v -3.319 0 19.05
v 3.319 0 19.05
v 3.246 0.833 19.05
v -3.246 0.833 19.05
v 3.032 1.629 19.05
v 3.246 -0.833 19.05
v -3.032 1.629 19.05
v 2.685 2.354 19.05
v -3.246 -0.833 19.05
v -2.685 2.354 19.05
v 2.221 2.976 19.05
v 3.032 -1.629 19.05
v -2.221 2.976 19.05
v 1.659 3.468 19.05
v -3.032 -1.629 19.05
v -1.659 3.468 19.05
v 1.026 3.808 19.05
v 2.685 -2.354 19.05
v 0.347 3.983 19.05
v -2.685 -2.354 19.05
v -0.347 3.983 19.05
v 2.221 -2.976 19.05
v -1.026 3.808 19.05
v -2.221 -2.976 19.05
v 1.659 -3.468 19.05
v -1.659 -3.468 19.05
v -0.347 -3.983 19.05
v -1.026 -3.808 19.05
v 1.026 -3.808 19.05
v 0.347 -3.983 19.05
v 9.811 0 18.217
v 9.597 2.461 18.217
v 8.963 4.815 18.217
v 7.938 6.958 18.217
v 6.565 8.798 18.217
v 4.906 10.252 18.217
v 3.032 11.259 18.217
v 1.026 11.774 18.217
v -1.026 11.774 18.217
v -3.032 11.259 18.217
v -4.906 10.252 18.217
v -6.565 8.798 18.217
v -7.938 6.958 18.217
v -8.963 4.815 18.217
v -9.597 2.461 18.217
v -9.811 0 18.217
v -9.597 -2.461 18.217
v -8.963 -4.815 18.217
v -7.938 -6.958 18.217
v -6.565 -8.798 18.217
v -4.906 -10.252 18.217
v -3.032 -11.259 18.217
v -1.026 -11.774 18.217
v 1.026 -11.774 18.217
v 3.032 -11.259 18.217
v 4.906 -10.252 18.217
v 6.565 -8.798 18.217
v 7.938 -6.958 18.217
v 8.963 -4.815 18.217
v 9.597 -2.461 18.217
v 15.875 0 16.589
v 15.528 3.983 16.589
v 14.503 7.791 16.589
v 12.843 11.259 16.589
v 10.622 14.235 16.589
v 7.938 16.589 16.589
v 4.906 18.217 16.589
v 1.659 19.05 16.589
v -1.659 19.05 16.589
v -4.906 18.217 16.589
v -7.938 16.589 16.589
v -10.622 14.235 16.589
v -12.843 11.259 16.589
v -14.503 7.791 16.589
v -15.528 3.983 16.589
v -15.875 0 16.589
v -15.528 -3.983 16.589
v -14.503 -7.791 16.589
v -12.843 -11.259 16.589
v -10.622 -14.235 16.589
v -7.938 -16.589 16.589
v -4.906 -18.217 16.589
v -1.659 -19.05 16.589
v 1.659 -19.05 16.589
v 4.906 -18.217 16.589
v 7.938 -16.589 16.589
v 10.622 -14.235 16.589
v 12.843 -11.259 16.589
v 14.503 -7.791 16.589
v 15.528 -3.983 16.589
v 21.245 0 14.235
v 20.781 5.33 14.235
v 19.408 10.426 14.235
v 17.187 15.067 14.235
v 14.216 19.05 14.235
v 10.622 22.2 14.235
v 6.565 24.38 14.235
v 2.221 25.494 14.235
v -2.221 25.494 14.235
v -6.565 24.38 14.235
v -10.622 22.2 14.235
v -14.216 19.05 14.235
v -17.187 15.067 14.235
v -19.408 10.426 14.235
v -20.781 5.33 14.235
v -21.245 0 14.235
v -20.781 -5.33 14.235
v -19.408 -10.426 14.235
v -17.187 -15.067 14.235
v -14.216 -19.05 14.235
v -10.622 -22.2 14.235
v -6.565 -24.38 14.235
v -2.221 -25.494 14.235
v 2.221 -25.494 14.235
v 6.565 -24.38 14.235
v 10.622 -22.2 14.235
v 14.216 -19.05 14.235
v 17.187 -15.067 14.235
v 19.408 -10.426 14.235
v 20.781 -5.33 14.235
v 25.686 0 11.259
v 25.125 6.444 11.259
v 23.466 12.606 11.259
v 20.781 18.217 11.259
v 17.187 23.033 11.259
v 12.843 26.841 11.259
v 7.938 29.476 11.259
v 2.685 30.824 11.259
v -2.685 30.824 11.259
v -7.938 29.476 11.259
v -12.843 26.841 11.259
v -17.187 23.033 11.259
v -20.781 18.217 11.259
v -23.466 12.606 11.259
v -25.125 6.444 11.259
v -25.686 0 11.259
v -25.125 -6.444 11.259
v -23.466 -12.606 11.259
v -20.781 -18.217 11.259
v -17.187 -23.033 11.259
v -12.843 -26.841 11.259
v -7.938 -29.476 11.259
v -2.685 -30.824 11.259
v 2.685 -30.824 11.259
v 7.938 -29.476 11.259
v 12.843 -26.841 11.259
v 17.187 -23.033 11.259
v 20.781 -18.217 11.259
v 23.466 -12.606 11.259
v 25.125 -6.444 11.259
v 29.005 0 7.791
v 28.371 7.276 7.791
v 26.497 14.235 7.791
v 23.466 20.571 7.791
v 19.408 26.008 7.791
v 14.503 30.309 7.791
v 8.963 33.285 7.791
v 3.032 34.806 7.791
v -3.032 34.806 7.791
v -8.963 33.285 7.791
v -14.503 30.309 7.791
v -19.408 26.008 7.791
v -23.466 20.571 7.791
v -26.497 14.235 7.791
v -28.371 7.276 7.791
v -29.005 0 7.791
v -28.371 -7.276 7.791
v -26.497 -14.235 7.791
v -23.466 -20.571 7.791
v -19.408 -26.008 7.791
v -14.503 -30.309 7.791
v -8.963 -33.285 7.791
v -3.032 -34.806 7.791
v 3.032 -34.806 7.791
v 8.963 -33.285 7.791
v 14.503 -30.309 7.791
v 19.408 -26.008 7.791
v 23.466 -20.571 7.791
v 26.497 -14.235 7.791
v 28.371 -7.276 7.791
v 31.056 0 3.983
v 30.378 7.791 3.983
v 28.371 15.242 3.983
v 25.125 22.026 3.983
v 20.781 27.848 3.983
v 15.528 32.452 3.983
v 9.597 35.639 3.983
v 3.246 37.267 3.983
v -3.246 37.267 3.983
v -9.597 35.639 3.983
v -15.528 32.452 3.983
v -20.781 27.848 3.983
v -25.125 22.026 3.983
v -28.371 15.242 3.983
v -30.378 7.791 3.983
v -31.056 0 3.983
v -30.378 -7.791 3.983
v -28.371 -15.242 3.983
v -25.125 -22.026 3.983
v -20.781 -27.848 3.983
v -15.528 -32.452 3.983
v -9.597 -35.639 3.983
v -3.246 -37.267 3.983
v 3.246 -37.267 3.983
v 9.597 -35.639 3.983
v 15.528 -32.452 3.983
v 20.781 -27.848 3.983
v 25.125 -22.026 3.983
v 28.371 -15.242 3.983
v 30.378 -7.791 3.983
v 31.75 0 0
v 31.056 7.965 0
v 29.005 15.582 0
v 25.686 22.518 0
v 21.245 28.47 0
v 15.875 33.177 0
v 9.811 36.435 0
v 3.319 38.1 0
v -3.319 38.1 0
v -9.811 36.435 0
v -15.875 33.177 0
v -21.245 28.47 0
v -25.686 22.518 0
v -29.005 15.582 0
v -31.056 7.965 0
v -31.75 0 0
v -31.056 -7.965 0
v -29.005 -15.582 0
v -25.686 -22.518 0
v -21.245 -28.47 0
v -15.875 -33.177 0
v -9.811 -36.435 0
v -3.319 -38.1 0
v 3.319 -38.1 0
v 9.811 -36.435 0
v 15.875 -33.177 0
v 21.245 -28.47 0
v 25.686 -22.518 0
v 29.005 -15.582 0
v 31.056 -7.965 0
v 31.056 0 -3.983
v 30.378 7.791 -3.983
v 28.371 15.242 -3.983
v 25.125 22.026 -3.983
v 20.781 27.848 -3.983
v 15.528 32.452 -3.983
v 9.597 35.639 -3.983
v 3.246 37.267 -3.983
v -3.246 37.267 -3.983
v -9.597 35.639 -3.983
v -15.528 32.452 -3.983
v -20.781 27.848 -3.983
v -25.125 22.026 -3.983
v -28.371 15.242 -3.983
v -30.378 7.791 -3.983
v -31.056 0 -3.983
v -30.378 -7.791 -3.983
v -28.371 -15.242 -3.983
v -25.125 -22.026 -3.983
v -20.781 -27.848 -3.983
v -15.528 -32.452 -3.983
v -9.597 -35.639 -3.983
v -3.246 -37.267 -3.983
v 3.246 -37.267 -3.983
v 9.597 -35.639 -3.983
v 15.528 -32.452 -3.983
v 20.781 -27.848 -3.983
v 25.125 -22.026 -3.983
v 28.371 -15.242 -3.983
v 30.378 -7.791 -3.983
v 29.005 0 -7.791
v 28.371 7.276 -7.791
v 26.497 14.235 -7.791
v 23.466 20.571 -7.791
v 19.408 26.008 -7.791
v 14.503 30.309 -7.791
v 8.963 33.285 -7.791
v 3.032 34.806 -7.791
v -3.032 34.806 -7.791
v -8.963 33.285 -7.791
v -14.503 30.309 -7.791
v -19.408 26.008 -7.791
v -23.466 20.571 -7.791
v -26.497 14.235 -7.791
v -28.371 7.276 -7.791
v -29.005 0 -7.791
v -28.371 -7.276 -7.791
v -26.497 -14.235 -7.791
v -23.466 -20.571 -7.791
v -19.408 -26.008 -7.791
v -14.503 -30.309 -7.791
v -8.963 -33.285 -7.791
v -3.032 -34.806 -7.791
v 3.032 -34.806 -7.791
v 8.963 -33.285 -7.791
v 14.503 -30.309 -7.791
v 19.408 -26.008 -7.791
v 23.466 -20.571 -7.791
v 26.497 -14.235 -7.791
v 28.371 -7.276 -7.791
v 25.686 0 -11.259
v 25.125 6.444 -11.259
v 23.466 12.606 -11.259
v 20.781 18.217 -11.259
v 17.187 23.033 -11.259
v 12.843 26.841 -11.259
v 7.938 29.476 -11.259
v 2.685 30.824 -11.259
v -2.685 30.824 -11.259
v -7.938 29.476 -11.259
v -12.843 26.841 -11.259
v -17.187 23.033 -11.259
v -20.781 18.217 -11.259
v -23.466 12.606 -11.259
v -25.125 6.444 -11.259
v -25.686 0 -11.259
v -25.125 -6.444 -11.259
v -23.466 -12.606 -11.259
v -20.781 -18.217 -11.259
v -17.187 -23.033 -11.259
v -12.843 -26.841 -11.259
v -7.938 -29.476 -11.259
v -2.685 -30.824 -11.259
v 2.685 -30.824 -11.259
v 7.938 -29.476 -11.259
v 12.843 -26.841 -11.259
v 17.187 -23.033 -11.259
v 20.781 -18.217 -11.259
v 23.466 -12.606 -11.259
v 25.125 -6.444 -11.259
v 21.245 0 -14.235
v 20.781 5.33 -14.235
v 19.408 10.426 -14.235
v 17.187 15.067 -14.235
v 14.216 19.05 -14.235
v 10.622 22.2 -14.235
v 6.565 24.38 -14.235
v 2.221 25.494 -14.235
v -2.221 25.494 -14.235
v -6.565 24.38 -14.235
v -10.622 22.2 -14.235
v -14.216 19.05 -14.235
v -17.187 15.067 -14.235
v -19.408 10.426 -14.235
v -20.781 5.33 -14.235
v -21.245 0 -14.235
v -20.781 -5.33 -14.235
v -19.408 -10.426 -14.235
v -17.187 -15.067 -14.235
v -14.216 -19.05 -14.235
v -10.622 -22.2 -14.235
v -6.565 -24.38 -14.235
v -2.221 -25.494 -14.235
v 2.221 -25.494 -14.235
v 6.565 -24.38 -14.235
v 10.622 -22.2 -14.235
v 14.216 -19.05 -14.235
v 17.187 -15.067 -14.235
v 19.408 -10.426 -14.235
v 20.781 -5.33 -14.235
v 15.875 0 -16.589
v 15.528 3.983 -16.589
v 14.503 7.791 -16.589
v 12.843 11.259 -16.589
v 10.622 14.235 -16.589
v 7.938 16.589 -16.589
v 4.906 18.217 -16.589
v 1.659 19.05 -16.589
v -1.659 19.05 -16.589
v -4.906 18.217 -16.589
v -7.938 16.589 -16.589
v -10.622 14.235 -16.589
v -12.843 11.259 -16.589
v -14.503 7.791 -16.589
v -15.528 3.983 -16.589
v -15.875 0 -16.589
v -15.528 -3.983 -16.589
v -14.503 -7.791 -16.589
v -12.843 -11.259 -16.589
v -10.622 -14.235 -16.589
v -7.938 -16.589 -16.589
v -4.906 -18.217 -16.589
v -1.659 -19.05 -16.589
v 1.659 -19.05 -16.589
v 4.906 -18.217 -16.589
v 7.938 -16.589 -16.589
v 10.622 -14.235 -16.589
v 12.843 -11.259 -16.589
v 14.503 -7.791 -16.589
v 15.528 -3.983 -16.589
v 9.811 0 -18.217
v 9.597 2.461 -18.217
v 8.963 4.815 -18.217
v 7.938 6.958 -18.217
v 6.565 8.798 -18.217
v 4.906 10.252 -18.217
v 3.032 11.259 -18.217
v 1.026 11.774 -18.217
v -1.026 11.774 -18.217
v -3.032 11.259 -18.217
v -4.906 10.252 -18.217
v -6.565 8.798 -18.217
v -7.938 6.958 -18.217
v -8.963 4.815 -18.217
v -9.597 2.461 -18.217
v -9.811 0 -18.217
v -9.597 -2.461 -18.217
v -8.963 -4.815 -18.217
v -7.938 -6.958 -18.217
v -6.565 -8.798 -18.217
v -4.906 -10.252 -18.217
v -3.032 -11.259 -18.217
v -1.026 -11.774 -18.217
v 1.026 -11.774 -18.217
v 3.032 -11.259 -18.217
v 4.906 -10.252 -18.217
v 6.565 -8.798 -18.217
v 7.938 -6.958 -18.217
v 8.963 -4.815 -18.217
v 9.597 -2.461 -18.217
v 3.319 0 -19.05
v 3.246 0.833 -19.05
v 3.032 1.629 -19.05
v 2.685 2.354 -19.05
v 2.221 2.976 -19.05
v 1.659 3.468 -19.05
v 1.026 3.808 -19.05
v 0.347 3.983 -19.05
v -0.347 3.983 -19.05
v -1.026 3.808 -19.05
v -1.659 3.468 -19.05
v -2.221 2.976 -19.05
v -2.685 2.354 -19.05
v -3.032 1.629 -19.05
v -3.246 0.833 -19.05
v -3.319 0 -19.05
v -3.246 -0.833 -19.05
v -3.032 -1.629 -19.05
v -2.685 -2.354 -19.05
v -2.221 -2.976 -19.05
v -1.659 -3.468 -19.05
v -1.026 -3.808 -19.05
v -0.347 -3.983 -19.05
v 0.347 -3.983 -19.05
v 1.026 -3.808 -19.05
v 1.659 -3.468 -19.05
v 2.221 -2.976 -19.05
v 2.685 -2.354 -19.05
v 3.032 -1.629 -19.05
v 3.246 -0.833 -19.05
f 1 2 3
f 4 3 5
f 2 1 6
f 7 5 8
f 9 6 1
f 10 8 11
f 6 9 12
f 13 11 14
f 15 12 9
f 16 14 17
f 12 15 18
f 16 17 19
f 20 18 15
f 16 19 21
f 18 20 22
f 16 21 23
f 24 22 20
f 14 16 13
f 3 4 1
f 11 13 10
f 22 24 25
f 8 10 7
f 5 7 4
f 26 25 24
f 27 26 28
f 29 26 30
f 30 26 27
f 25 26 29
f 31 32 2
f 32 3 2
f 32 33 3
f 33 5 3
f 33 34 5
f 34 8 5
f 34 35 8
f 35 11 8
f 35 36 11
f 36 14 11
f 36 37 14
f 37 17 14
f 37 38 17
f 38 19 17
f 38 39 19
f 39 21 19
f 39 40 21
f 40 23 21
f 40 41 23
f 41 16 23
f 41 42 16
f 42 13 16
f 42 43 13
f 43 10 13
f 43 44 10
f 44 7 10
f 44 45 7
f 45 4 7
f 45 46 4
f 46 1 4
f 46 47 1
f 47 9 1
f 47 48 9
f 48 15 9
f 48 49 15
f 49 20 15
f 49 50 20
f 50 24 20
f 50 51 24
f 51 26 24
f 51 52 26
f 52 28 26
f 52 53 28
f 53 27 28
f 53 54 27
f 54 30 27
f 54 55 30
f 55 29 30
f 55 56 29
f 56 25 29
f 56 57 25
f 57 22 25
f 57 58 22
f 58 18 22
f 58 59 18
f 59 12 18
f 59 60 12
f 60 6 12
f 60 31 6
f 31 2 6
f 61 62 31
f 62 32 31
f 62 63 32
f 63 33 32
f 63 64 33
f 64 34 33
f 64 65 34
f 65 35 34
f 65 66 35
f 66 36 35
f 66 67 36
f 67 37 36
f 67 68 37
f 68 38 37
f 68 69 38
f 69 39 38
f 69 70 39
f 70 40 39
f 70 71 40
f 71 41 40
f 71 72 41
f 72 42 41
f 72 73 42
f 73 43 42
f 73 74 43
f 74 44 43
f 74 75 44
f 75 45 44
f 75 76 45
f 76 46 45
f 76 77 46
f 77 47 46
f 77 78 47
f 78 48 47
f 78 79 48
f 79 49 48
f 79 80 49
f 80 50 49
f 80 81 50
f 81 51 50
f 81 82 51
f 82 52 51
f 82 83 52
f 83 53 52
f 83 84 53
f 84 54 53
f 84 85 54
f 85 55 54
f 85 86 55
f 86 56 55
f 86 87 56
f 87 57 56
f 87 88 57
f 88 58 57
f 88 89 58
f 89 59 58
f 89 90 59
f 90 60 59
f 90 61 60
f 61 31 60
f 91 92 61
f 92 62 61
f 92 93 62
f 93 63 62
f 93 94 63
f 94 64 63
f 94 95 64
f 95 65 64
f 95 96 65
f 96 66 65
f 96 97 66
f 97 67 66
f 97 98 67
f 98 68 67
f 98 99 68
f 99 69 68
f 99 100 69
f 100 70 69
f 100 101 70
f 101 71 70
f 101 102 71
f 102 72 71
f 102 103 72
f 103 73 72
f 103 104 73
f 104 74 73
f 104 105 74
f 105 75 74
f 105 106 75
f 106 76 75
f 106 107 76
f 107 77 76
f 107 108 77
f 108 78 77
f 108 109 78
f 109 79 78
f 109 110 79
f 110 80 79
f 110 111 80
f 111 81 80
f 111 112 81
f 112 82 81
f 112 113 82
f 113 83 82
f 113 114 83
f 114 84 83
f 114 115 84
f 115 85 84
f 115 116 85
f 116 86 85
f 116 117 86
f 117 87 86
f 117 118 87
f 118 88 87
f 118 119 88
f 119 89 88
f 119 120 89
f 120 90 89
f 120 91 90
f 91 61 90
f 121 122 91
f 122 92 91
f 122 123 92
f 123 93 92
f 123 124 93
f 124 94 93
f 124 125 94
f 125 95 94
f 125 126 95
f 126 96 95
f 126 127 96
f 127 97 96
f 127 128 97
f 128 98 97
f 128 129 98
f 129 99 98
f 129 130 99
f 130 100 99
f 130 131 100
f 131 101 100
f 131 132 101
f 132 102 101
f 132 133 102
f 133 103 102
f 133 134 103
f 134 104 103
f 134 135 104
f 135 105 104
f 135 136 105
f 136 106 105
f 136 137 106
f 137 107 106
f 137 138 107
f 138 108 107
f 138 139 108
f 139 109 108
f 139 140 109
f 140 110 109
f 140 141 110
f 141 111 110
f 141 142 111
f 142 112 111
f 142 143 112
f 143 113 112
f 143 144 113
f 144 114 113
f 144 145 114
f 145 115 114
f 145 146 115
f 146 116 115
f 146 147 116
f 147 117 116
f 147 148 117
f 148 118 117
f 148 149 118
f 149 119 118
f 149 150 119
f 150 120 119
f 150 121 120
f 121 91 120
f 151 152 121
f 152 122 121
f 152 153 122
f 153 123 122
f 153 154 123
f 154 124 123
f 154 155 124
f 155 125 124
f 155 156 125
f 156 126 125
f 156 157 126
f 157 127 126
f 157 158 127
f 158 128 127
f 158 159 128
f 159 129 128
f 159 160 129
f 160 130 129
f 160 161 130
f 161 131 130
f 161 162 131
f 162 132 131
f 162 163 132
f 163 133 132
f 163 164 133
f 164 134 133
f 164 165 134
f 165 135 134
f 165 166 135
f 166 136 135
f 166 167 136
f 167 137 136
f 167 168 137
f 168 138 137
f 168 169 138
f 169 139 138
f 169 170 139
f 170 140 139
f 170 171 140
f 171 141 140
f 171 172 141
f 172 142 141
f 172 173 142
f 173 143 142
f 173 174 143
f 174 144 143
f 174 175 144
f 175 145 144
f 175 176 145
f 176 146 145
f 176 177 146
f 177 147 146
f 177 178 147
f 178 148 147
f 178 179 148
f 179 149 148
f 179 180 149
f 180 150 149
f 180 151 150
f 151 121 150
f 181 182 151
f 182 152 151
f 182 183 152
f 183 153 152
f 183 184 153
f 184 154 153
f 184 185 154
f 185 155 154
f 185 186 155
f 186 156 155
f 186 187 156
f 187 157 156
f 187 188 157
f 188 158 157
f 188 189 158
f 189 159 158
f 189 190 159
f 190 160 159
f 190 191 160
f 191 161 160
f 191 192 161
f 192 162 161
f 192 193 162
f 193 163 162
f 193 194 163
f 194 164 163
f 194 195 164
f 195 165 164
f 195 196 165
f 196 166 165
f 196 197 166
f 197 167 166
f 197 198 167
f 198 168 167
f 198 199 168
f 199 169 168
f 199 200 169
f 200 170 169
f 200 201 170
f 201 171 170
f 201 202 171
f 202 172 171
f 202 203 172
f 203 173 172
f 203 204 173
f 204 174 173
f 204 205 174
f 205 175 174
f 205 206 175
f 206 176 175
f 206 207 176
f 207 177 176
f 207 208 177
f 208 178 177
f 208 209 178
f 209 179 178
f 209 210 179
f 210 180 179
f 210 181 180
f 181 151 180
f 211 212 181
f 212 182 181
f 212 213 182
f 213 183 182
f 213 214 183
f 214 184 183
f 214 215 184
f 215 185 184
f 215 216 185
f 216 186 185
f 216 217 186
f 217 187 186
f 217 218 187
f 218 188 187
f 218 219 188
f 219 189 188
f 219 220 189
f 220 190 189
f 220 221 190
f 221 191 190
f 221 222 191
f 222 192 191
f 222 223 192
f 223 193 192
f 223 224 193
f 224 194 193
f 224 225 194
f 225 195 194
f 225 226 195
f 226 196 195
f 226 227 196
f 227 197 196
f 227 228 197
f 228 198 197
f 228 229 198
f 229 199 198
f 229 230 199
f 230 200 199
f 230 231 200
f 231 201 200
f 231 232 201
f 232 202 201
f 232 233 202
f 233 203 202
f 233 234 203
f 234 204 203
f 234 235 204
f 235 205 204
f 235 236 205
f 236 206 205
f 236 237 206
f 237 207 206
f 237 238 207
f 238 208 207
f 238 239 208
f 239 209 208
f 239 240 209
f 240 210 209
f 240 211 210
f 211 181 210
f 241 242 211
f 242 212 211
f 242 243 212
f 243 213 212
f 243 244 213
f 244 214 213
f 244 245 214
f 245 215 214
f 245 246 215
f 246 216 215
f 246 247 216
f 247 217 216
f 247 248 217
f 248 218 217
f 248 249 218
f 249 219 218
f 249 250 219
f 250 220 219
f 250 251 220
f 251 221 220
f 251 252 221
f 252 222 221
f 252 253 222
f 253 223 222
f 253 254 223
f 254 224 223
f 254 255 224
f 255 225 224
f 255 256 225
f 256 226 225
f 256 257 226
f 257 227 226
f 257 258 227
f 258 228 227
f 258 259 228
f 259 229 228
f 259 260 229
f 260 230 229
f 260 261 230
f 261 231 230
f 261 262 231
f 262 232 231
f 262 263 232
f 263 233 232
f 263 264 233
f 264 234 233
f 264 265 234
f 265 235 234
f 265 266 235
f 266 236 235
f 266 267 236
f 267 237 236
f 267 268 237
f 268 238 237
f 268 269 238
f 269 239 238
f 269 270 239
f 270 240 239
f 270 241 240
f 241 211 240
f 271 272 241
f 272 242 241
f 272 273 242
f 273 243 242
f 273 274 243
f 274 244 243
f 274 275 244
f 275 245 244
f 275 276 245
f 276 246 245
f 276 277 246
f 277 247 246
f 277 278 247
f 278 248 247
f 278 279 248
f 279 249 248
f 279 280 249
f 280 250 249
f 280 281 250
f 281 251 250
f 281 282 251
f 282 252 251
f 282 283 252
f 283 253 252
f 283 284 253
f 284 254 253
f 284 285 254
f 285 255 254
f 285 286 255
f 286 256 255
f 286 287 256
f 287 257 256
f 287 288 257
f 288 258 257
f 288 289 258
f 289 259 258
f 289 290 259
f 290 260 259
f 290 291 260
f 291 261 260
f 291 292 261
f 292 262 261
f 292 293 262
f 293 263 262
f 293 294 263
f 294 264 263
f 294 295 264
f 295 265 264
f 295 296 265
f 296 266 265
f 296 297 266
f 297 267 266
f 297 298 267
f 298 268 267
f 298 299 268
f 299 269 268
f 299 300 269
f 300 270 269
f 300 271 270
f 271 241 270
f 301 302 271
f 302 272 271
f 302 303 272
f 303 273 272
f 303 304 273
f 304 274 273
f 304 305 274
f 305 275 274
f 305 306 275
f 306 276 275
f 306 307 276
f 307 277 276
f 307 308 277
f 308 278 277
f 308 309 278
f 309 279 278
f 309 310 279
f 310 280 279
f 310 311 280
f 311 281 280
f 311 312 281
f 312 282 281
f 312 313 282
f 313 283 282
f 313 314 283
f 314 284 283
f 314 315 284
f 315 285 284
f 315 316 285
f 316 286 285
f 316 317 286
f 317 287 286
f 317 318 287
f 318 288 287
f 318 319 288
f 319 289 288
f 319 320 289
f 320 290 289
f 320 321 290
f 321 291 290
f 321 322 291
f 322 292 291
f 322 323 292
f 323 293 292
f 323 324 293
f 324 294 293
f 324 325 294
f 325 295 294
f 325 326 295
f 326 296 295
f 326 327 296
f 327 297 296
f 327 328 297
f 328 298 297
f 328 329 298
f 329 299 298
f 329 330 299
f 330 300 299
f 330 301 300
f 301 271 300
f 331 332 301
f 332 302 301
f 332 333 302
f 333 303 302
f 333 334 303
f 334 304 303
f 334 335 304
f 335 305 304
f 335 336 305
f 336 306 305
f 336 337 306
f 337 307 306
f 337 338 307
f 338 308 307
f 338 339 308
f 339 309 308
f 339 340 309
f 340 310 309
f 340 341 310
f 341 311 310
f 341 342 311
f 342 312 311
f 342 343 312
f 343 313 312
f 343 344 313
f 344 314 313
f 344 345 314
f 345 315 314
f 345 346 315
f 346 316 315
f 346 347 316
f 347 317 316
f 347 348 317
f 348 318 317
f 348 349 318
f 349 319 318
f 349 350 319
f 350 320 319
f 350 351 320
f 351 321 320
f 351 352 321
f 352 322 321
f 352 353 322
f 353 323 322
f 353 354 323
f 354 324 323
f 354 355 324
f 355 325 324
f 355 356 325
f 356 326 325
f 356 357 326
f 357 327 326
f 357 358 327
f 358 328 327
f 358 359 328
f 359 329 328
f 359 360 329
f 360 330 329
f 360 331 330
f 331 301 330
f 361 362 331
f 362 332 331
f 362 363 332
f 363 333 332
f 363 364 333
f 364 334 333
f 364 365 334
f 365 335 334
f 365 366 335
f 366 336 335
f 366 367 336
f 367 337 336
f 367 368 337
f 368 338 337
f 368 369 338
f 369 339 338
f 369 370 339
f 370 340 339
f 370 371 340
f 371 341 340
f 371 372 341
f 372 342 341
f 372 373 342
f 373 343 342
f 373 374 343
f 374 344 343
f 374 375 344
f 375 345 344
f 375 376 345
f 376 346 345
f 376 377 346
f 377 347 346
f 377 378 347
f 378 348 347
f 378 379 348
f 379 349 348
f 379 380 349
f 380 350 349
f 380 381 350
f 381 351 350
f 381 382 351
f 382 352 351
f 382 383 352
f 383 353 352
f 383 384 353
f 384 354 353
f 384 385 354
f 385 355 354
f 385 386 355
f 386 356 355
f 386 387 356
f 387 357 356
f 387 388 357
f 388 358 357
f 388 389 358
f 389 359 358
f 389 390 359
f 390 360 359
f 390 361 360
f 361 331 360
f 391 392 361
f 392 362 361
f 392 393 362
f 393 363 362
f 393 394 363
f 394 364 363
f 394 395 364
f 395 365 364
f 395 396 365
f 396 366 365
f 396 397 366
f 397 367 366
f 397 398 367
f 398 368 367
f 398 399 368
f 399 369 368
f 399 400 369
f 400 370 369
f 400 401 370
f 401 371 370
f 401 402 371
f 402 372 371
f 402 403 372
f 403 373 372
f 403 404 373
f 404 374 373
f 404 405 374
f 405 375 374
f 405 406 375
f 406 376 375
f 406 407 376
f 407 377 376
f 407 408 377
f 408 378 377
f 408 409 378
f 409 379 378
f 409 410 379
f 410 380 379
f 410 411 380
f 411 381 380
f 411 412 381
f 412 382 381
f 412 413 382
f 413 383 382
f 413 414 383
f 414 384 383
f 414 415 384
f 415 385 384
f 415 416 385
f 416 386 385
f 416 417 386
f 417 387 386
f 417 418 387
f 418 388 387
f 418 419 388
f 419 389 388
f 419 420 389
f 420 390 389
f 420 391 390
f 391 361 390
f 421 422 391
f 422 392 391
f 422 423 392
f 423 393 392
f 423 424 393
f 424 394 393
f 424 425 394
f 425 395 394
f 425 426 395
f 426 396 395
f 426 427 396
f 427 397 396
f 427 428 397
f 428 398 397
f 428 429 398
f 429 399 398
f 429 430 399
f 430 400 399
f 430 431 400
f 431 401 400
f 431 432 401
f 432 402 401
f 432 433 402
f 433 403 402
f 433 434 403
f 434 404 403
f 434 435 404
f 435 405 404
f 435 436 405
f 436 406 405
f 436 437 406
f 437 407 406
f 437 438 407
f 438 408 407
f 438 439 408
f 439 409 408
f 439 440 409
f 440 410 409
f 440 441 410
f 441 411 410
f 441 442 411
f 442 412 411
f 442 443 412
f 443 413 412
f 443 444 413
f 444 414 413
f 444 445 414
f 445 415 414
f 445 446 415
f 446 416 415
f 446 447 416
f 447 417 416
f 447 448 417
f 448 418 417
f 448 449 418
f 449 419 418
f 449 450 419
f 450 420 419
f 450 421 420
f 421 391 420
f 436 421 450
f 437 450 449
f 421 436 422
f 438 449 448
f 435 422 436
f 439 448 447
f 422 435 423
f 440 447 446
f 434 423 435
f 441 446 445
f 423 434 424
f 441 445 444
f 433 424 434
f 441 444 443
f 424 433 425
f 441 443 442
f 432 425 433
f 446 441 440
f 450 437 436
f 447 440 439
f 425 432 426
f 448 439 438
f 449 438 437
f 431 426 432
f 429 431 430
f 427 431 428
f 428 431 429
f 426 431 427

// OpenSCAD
//Enter in inches how far the gem goes forward
height = 1.5;

//Enter in inches how wide it must be
width = 2.5;

//Enter in inches how long it must be (equal or higher than width!)
length = 3;

//Leave the back flat?
flat_back = 0; // [1:Leave Back Flat, 0:No! Both Sides]

cubehelp = (length + 10)*25.4;


if (flat_back == 1)
{
difference(){
	resize([width*25.4, length*25.4, height*25.4]) sphere(10);
	translate([-cubehelp/2, -cubehelp/2, -cubehelp]) cube(cubehelp);
	}
}
else
{
	resize([width*25.4, length*25.4, height*25.4]) sphere(10);
}
